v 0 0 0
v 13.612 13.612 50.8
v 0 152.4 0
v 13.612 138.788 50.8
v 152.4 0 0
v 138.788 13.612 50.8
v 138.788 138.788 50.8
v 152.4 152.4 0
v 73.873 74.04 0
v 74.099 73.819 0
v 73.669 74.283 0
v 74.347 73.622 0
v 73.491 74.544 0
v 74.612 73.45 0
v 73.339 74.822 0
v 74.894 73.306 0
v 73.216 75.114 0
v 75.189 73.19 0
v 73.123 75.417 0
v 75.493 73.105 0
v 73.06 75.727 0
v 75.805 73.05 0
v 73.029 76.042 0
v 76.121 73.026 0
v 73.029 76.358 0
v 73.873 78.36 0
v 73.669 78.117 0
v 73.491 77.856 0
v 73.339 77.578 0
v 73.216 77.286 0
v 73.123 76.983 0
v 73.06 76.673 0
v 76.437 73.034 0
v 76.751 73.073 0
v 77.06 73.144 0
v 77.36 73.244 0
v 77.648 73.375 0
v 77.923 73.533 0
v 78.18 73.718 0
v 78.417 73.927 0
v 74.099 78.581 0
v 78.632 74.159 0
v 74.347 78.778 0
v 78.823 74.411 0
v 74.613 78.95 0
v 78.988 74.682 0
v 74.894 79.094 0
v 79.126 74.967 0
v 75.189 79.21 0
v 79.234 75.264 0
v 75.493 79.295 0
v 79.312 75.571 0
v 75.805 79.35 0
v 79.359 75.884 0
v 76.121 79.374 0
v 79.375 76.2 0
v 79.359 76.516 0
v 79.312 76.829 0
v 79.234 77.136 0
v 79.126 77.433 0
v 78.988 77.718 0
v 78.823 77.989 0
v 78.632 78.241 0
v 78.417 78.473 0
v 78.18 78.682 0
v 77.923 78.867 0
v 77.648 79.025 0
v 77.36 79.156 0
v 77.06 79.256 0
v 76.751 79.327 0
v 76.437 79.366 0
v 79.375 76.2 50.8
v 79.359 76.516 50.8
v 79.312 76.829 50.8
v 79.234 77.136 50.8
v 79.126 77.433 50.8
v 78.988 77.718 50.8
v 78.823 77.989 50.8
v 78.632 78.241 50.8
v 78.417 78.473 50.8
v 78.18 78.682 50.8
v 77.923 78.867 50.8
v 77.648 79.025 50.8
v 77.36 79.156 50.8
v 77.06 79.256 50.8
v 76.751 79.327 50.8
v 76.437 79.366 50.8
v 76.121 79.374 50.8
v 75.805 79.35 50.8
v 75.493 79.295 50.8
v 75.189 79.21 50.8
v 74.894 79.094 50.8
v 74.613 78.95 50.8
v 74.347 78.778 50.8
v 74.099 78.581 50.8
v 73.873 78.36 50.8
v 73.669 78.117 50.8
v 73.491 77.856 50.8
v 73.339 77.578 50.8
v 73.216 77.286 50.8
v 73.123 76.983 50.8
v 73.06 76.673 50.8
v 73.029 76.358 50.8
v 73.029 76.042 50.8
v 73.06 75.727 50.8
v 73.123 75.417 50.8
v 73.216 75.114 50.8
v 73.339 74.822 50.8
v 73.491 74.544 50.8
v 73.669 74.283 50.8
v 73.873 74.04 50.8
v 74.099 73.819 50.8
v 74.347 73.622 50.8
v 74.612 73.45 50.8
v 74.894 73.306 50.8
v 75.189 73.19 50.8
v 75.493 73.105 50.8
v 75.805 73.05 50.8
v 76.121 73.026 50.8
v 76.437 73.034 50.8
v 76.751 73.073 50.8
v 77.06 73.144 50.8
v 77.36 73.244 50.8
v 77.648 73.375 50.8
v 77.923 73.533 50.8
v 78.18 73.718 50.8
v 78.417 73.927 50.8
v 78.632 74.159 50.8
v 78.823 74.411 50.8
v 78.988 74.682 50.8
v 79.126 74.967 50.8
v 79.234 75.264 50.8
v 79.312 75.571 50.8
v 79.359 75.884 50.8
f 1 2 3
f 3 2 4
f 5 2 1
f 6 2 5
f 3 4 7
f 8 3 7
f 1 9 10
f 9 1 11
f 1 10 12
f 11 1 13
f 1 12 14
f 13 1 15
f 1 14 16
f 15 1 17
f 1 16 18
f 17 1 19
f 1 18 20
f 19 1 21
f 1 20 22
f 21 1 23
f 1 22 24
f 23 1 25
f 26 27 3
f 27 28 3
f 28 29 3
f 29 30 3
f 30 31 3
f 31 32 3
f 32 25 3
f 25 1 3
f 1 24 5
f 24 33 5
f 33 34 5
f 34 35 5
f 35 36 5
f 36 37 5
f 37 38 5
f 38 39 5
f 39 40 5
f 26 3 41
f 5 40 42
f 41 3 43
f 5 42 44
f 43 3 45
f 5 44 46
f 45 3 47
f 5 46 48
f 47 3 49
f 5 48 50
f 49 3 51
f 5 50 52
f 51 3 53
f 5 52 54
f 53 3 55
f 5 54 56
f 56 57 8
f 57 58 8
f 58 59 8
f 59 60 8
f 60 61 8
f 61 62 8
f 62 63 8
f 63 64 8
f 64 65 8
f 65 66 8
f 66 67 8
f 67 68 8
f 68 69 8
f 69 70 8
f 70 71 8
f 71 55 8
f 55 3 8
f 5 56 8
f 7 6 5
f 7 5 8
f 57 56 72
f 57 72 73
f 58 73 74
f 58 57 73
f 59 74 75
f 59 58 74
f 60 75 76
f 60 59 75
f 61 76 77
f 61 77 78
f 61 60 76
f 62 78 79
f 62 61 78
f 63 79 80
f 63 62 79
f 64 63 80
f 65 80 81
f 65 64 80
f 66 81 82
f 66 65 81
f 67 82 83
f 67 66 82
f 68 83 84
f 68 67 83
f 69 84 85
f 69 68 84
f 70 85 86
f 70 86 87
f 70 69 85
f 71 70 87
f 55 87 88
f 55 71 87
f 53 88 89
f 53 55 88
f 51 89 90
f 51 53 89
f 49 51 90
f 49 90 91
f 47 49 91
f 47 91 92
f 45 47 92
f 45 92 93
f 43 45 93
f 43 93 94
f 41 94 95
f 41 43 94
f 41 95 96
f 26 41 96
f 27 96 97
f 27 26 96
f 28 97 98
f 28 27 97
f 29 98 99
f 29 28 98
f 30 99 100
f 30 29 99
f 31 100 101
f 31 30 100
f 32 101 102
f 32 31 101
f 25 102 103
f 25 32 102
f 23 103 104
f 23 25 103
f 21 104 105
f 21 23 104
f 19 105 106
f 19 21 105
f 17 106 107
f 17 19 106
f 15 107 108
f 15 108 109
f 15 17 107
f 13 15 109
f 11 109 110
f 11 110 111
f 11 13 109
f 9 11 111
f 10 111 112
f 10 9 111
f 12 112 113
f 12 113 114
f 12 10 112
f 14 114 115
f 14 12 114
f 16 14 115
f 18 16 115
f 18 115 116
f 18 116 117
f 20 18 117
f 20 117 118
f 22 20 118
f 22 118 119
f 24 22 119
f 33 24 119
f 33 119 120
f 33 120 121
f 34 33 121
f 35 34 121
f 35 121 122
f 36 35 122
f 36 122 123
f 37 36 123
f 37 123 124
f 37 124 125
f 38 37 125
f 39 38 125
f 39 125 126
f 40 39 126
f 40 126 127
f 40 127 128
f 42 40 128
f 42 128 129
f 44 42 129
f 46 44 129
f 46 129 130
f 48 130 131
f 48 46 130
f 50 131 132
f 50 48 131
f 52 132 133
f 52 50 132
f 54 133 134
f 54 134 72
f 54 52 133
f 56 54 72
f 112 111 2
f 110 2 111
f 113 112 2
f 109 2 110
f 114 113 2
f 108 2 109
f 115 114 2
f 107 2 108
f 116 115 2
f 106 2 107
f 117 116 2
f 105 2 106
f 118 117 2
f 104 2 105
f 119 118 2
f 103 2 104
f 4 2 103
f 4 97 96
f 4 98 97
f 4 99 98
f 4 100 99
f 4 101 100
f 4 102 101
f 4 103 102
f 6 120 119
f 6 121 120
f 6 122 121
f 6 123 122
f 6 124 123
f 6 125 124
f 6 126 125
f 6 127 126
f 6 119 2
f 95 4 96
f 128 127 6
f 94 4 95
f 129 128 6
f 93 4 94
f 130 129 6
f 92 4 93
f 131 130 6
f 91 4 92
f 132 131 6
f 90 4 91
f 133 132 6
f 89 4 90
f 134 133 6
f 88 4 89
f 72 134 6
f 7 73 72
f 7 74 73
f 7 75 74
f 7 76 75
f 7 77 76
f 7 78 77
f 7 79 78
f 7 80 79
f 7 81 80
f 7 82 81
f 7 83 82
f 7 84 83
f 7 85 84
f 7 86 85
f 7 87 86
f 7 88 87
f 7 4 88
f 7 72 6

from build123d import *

# Parameters (mm, degrees)
F0_W     = 152.4
F0_H     = 152.4
F0_R     = 3.175
F1_DEPTH = 50.8
F2_SIZE2 = 13.611809
F2_SIZE  = 50.79999


# Not quite as in the source:
# - a fillet or chamfer is up to 0.001 mm smaller than in the source, because OpenCascade refuses the exact size
# - a feature names something its author has since deleted; it is built from what else it names


with BuildPart() as f1:
    # F0 (on Top) → F1 (new body)
    with BuildSketch(Plane.XY):
        with Locations((76.2, 76.2)):
            Rectangle(F0_W, F0_H)
        with Locations((76.2, 76.2)):
            Circle(F0_R, mode=Mode.SUBTRACT)
    extrude(amount=F1_DEPTH)

    # F2 (size 50.8 and 13.6118189755 in the source; OpenCascade refuses exactly that, so slightly less here)
    f2_edges = [f1.edges().sort_by_distance(p)[0] for p in [
        (0, 76.2, 50.8),
        (76.2, 152.4, 50.8),
        (152.4, 76.2, 50.8),
        (76.2, 0, 50.8),
    ]]
    chamfer(f2_edges, length=F2_SIZE, length2=F2_SIZE2)


solid = f1.part
